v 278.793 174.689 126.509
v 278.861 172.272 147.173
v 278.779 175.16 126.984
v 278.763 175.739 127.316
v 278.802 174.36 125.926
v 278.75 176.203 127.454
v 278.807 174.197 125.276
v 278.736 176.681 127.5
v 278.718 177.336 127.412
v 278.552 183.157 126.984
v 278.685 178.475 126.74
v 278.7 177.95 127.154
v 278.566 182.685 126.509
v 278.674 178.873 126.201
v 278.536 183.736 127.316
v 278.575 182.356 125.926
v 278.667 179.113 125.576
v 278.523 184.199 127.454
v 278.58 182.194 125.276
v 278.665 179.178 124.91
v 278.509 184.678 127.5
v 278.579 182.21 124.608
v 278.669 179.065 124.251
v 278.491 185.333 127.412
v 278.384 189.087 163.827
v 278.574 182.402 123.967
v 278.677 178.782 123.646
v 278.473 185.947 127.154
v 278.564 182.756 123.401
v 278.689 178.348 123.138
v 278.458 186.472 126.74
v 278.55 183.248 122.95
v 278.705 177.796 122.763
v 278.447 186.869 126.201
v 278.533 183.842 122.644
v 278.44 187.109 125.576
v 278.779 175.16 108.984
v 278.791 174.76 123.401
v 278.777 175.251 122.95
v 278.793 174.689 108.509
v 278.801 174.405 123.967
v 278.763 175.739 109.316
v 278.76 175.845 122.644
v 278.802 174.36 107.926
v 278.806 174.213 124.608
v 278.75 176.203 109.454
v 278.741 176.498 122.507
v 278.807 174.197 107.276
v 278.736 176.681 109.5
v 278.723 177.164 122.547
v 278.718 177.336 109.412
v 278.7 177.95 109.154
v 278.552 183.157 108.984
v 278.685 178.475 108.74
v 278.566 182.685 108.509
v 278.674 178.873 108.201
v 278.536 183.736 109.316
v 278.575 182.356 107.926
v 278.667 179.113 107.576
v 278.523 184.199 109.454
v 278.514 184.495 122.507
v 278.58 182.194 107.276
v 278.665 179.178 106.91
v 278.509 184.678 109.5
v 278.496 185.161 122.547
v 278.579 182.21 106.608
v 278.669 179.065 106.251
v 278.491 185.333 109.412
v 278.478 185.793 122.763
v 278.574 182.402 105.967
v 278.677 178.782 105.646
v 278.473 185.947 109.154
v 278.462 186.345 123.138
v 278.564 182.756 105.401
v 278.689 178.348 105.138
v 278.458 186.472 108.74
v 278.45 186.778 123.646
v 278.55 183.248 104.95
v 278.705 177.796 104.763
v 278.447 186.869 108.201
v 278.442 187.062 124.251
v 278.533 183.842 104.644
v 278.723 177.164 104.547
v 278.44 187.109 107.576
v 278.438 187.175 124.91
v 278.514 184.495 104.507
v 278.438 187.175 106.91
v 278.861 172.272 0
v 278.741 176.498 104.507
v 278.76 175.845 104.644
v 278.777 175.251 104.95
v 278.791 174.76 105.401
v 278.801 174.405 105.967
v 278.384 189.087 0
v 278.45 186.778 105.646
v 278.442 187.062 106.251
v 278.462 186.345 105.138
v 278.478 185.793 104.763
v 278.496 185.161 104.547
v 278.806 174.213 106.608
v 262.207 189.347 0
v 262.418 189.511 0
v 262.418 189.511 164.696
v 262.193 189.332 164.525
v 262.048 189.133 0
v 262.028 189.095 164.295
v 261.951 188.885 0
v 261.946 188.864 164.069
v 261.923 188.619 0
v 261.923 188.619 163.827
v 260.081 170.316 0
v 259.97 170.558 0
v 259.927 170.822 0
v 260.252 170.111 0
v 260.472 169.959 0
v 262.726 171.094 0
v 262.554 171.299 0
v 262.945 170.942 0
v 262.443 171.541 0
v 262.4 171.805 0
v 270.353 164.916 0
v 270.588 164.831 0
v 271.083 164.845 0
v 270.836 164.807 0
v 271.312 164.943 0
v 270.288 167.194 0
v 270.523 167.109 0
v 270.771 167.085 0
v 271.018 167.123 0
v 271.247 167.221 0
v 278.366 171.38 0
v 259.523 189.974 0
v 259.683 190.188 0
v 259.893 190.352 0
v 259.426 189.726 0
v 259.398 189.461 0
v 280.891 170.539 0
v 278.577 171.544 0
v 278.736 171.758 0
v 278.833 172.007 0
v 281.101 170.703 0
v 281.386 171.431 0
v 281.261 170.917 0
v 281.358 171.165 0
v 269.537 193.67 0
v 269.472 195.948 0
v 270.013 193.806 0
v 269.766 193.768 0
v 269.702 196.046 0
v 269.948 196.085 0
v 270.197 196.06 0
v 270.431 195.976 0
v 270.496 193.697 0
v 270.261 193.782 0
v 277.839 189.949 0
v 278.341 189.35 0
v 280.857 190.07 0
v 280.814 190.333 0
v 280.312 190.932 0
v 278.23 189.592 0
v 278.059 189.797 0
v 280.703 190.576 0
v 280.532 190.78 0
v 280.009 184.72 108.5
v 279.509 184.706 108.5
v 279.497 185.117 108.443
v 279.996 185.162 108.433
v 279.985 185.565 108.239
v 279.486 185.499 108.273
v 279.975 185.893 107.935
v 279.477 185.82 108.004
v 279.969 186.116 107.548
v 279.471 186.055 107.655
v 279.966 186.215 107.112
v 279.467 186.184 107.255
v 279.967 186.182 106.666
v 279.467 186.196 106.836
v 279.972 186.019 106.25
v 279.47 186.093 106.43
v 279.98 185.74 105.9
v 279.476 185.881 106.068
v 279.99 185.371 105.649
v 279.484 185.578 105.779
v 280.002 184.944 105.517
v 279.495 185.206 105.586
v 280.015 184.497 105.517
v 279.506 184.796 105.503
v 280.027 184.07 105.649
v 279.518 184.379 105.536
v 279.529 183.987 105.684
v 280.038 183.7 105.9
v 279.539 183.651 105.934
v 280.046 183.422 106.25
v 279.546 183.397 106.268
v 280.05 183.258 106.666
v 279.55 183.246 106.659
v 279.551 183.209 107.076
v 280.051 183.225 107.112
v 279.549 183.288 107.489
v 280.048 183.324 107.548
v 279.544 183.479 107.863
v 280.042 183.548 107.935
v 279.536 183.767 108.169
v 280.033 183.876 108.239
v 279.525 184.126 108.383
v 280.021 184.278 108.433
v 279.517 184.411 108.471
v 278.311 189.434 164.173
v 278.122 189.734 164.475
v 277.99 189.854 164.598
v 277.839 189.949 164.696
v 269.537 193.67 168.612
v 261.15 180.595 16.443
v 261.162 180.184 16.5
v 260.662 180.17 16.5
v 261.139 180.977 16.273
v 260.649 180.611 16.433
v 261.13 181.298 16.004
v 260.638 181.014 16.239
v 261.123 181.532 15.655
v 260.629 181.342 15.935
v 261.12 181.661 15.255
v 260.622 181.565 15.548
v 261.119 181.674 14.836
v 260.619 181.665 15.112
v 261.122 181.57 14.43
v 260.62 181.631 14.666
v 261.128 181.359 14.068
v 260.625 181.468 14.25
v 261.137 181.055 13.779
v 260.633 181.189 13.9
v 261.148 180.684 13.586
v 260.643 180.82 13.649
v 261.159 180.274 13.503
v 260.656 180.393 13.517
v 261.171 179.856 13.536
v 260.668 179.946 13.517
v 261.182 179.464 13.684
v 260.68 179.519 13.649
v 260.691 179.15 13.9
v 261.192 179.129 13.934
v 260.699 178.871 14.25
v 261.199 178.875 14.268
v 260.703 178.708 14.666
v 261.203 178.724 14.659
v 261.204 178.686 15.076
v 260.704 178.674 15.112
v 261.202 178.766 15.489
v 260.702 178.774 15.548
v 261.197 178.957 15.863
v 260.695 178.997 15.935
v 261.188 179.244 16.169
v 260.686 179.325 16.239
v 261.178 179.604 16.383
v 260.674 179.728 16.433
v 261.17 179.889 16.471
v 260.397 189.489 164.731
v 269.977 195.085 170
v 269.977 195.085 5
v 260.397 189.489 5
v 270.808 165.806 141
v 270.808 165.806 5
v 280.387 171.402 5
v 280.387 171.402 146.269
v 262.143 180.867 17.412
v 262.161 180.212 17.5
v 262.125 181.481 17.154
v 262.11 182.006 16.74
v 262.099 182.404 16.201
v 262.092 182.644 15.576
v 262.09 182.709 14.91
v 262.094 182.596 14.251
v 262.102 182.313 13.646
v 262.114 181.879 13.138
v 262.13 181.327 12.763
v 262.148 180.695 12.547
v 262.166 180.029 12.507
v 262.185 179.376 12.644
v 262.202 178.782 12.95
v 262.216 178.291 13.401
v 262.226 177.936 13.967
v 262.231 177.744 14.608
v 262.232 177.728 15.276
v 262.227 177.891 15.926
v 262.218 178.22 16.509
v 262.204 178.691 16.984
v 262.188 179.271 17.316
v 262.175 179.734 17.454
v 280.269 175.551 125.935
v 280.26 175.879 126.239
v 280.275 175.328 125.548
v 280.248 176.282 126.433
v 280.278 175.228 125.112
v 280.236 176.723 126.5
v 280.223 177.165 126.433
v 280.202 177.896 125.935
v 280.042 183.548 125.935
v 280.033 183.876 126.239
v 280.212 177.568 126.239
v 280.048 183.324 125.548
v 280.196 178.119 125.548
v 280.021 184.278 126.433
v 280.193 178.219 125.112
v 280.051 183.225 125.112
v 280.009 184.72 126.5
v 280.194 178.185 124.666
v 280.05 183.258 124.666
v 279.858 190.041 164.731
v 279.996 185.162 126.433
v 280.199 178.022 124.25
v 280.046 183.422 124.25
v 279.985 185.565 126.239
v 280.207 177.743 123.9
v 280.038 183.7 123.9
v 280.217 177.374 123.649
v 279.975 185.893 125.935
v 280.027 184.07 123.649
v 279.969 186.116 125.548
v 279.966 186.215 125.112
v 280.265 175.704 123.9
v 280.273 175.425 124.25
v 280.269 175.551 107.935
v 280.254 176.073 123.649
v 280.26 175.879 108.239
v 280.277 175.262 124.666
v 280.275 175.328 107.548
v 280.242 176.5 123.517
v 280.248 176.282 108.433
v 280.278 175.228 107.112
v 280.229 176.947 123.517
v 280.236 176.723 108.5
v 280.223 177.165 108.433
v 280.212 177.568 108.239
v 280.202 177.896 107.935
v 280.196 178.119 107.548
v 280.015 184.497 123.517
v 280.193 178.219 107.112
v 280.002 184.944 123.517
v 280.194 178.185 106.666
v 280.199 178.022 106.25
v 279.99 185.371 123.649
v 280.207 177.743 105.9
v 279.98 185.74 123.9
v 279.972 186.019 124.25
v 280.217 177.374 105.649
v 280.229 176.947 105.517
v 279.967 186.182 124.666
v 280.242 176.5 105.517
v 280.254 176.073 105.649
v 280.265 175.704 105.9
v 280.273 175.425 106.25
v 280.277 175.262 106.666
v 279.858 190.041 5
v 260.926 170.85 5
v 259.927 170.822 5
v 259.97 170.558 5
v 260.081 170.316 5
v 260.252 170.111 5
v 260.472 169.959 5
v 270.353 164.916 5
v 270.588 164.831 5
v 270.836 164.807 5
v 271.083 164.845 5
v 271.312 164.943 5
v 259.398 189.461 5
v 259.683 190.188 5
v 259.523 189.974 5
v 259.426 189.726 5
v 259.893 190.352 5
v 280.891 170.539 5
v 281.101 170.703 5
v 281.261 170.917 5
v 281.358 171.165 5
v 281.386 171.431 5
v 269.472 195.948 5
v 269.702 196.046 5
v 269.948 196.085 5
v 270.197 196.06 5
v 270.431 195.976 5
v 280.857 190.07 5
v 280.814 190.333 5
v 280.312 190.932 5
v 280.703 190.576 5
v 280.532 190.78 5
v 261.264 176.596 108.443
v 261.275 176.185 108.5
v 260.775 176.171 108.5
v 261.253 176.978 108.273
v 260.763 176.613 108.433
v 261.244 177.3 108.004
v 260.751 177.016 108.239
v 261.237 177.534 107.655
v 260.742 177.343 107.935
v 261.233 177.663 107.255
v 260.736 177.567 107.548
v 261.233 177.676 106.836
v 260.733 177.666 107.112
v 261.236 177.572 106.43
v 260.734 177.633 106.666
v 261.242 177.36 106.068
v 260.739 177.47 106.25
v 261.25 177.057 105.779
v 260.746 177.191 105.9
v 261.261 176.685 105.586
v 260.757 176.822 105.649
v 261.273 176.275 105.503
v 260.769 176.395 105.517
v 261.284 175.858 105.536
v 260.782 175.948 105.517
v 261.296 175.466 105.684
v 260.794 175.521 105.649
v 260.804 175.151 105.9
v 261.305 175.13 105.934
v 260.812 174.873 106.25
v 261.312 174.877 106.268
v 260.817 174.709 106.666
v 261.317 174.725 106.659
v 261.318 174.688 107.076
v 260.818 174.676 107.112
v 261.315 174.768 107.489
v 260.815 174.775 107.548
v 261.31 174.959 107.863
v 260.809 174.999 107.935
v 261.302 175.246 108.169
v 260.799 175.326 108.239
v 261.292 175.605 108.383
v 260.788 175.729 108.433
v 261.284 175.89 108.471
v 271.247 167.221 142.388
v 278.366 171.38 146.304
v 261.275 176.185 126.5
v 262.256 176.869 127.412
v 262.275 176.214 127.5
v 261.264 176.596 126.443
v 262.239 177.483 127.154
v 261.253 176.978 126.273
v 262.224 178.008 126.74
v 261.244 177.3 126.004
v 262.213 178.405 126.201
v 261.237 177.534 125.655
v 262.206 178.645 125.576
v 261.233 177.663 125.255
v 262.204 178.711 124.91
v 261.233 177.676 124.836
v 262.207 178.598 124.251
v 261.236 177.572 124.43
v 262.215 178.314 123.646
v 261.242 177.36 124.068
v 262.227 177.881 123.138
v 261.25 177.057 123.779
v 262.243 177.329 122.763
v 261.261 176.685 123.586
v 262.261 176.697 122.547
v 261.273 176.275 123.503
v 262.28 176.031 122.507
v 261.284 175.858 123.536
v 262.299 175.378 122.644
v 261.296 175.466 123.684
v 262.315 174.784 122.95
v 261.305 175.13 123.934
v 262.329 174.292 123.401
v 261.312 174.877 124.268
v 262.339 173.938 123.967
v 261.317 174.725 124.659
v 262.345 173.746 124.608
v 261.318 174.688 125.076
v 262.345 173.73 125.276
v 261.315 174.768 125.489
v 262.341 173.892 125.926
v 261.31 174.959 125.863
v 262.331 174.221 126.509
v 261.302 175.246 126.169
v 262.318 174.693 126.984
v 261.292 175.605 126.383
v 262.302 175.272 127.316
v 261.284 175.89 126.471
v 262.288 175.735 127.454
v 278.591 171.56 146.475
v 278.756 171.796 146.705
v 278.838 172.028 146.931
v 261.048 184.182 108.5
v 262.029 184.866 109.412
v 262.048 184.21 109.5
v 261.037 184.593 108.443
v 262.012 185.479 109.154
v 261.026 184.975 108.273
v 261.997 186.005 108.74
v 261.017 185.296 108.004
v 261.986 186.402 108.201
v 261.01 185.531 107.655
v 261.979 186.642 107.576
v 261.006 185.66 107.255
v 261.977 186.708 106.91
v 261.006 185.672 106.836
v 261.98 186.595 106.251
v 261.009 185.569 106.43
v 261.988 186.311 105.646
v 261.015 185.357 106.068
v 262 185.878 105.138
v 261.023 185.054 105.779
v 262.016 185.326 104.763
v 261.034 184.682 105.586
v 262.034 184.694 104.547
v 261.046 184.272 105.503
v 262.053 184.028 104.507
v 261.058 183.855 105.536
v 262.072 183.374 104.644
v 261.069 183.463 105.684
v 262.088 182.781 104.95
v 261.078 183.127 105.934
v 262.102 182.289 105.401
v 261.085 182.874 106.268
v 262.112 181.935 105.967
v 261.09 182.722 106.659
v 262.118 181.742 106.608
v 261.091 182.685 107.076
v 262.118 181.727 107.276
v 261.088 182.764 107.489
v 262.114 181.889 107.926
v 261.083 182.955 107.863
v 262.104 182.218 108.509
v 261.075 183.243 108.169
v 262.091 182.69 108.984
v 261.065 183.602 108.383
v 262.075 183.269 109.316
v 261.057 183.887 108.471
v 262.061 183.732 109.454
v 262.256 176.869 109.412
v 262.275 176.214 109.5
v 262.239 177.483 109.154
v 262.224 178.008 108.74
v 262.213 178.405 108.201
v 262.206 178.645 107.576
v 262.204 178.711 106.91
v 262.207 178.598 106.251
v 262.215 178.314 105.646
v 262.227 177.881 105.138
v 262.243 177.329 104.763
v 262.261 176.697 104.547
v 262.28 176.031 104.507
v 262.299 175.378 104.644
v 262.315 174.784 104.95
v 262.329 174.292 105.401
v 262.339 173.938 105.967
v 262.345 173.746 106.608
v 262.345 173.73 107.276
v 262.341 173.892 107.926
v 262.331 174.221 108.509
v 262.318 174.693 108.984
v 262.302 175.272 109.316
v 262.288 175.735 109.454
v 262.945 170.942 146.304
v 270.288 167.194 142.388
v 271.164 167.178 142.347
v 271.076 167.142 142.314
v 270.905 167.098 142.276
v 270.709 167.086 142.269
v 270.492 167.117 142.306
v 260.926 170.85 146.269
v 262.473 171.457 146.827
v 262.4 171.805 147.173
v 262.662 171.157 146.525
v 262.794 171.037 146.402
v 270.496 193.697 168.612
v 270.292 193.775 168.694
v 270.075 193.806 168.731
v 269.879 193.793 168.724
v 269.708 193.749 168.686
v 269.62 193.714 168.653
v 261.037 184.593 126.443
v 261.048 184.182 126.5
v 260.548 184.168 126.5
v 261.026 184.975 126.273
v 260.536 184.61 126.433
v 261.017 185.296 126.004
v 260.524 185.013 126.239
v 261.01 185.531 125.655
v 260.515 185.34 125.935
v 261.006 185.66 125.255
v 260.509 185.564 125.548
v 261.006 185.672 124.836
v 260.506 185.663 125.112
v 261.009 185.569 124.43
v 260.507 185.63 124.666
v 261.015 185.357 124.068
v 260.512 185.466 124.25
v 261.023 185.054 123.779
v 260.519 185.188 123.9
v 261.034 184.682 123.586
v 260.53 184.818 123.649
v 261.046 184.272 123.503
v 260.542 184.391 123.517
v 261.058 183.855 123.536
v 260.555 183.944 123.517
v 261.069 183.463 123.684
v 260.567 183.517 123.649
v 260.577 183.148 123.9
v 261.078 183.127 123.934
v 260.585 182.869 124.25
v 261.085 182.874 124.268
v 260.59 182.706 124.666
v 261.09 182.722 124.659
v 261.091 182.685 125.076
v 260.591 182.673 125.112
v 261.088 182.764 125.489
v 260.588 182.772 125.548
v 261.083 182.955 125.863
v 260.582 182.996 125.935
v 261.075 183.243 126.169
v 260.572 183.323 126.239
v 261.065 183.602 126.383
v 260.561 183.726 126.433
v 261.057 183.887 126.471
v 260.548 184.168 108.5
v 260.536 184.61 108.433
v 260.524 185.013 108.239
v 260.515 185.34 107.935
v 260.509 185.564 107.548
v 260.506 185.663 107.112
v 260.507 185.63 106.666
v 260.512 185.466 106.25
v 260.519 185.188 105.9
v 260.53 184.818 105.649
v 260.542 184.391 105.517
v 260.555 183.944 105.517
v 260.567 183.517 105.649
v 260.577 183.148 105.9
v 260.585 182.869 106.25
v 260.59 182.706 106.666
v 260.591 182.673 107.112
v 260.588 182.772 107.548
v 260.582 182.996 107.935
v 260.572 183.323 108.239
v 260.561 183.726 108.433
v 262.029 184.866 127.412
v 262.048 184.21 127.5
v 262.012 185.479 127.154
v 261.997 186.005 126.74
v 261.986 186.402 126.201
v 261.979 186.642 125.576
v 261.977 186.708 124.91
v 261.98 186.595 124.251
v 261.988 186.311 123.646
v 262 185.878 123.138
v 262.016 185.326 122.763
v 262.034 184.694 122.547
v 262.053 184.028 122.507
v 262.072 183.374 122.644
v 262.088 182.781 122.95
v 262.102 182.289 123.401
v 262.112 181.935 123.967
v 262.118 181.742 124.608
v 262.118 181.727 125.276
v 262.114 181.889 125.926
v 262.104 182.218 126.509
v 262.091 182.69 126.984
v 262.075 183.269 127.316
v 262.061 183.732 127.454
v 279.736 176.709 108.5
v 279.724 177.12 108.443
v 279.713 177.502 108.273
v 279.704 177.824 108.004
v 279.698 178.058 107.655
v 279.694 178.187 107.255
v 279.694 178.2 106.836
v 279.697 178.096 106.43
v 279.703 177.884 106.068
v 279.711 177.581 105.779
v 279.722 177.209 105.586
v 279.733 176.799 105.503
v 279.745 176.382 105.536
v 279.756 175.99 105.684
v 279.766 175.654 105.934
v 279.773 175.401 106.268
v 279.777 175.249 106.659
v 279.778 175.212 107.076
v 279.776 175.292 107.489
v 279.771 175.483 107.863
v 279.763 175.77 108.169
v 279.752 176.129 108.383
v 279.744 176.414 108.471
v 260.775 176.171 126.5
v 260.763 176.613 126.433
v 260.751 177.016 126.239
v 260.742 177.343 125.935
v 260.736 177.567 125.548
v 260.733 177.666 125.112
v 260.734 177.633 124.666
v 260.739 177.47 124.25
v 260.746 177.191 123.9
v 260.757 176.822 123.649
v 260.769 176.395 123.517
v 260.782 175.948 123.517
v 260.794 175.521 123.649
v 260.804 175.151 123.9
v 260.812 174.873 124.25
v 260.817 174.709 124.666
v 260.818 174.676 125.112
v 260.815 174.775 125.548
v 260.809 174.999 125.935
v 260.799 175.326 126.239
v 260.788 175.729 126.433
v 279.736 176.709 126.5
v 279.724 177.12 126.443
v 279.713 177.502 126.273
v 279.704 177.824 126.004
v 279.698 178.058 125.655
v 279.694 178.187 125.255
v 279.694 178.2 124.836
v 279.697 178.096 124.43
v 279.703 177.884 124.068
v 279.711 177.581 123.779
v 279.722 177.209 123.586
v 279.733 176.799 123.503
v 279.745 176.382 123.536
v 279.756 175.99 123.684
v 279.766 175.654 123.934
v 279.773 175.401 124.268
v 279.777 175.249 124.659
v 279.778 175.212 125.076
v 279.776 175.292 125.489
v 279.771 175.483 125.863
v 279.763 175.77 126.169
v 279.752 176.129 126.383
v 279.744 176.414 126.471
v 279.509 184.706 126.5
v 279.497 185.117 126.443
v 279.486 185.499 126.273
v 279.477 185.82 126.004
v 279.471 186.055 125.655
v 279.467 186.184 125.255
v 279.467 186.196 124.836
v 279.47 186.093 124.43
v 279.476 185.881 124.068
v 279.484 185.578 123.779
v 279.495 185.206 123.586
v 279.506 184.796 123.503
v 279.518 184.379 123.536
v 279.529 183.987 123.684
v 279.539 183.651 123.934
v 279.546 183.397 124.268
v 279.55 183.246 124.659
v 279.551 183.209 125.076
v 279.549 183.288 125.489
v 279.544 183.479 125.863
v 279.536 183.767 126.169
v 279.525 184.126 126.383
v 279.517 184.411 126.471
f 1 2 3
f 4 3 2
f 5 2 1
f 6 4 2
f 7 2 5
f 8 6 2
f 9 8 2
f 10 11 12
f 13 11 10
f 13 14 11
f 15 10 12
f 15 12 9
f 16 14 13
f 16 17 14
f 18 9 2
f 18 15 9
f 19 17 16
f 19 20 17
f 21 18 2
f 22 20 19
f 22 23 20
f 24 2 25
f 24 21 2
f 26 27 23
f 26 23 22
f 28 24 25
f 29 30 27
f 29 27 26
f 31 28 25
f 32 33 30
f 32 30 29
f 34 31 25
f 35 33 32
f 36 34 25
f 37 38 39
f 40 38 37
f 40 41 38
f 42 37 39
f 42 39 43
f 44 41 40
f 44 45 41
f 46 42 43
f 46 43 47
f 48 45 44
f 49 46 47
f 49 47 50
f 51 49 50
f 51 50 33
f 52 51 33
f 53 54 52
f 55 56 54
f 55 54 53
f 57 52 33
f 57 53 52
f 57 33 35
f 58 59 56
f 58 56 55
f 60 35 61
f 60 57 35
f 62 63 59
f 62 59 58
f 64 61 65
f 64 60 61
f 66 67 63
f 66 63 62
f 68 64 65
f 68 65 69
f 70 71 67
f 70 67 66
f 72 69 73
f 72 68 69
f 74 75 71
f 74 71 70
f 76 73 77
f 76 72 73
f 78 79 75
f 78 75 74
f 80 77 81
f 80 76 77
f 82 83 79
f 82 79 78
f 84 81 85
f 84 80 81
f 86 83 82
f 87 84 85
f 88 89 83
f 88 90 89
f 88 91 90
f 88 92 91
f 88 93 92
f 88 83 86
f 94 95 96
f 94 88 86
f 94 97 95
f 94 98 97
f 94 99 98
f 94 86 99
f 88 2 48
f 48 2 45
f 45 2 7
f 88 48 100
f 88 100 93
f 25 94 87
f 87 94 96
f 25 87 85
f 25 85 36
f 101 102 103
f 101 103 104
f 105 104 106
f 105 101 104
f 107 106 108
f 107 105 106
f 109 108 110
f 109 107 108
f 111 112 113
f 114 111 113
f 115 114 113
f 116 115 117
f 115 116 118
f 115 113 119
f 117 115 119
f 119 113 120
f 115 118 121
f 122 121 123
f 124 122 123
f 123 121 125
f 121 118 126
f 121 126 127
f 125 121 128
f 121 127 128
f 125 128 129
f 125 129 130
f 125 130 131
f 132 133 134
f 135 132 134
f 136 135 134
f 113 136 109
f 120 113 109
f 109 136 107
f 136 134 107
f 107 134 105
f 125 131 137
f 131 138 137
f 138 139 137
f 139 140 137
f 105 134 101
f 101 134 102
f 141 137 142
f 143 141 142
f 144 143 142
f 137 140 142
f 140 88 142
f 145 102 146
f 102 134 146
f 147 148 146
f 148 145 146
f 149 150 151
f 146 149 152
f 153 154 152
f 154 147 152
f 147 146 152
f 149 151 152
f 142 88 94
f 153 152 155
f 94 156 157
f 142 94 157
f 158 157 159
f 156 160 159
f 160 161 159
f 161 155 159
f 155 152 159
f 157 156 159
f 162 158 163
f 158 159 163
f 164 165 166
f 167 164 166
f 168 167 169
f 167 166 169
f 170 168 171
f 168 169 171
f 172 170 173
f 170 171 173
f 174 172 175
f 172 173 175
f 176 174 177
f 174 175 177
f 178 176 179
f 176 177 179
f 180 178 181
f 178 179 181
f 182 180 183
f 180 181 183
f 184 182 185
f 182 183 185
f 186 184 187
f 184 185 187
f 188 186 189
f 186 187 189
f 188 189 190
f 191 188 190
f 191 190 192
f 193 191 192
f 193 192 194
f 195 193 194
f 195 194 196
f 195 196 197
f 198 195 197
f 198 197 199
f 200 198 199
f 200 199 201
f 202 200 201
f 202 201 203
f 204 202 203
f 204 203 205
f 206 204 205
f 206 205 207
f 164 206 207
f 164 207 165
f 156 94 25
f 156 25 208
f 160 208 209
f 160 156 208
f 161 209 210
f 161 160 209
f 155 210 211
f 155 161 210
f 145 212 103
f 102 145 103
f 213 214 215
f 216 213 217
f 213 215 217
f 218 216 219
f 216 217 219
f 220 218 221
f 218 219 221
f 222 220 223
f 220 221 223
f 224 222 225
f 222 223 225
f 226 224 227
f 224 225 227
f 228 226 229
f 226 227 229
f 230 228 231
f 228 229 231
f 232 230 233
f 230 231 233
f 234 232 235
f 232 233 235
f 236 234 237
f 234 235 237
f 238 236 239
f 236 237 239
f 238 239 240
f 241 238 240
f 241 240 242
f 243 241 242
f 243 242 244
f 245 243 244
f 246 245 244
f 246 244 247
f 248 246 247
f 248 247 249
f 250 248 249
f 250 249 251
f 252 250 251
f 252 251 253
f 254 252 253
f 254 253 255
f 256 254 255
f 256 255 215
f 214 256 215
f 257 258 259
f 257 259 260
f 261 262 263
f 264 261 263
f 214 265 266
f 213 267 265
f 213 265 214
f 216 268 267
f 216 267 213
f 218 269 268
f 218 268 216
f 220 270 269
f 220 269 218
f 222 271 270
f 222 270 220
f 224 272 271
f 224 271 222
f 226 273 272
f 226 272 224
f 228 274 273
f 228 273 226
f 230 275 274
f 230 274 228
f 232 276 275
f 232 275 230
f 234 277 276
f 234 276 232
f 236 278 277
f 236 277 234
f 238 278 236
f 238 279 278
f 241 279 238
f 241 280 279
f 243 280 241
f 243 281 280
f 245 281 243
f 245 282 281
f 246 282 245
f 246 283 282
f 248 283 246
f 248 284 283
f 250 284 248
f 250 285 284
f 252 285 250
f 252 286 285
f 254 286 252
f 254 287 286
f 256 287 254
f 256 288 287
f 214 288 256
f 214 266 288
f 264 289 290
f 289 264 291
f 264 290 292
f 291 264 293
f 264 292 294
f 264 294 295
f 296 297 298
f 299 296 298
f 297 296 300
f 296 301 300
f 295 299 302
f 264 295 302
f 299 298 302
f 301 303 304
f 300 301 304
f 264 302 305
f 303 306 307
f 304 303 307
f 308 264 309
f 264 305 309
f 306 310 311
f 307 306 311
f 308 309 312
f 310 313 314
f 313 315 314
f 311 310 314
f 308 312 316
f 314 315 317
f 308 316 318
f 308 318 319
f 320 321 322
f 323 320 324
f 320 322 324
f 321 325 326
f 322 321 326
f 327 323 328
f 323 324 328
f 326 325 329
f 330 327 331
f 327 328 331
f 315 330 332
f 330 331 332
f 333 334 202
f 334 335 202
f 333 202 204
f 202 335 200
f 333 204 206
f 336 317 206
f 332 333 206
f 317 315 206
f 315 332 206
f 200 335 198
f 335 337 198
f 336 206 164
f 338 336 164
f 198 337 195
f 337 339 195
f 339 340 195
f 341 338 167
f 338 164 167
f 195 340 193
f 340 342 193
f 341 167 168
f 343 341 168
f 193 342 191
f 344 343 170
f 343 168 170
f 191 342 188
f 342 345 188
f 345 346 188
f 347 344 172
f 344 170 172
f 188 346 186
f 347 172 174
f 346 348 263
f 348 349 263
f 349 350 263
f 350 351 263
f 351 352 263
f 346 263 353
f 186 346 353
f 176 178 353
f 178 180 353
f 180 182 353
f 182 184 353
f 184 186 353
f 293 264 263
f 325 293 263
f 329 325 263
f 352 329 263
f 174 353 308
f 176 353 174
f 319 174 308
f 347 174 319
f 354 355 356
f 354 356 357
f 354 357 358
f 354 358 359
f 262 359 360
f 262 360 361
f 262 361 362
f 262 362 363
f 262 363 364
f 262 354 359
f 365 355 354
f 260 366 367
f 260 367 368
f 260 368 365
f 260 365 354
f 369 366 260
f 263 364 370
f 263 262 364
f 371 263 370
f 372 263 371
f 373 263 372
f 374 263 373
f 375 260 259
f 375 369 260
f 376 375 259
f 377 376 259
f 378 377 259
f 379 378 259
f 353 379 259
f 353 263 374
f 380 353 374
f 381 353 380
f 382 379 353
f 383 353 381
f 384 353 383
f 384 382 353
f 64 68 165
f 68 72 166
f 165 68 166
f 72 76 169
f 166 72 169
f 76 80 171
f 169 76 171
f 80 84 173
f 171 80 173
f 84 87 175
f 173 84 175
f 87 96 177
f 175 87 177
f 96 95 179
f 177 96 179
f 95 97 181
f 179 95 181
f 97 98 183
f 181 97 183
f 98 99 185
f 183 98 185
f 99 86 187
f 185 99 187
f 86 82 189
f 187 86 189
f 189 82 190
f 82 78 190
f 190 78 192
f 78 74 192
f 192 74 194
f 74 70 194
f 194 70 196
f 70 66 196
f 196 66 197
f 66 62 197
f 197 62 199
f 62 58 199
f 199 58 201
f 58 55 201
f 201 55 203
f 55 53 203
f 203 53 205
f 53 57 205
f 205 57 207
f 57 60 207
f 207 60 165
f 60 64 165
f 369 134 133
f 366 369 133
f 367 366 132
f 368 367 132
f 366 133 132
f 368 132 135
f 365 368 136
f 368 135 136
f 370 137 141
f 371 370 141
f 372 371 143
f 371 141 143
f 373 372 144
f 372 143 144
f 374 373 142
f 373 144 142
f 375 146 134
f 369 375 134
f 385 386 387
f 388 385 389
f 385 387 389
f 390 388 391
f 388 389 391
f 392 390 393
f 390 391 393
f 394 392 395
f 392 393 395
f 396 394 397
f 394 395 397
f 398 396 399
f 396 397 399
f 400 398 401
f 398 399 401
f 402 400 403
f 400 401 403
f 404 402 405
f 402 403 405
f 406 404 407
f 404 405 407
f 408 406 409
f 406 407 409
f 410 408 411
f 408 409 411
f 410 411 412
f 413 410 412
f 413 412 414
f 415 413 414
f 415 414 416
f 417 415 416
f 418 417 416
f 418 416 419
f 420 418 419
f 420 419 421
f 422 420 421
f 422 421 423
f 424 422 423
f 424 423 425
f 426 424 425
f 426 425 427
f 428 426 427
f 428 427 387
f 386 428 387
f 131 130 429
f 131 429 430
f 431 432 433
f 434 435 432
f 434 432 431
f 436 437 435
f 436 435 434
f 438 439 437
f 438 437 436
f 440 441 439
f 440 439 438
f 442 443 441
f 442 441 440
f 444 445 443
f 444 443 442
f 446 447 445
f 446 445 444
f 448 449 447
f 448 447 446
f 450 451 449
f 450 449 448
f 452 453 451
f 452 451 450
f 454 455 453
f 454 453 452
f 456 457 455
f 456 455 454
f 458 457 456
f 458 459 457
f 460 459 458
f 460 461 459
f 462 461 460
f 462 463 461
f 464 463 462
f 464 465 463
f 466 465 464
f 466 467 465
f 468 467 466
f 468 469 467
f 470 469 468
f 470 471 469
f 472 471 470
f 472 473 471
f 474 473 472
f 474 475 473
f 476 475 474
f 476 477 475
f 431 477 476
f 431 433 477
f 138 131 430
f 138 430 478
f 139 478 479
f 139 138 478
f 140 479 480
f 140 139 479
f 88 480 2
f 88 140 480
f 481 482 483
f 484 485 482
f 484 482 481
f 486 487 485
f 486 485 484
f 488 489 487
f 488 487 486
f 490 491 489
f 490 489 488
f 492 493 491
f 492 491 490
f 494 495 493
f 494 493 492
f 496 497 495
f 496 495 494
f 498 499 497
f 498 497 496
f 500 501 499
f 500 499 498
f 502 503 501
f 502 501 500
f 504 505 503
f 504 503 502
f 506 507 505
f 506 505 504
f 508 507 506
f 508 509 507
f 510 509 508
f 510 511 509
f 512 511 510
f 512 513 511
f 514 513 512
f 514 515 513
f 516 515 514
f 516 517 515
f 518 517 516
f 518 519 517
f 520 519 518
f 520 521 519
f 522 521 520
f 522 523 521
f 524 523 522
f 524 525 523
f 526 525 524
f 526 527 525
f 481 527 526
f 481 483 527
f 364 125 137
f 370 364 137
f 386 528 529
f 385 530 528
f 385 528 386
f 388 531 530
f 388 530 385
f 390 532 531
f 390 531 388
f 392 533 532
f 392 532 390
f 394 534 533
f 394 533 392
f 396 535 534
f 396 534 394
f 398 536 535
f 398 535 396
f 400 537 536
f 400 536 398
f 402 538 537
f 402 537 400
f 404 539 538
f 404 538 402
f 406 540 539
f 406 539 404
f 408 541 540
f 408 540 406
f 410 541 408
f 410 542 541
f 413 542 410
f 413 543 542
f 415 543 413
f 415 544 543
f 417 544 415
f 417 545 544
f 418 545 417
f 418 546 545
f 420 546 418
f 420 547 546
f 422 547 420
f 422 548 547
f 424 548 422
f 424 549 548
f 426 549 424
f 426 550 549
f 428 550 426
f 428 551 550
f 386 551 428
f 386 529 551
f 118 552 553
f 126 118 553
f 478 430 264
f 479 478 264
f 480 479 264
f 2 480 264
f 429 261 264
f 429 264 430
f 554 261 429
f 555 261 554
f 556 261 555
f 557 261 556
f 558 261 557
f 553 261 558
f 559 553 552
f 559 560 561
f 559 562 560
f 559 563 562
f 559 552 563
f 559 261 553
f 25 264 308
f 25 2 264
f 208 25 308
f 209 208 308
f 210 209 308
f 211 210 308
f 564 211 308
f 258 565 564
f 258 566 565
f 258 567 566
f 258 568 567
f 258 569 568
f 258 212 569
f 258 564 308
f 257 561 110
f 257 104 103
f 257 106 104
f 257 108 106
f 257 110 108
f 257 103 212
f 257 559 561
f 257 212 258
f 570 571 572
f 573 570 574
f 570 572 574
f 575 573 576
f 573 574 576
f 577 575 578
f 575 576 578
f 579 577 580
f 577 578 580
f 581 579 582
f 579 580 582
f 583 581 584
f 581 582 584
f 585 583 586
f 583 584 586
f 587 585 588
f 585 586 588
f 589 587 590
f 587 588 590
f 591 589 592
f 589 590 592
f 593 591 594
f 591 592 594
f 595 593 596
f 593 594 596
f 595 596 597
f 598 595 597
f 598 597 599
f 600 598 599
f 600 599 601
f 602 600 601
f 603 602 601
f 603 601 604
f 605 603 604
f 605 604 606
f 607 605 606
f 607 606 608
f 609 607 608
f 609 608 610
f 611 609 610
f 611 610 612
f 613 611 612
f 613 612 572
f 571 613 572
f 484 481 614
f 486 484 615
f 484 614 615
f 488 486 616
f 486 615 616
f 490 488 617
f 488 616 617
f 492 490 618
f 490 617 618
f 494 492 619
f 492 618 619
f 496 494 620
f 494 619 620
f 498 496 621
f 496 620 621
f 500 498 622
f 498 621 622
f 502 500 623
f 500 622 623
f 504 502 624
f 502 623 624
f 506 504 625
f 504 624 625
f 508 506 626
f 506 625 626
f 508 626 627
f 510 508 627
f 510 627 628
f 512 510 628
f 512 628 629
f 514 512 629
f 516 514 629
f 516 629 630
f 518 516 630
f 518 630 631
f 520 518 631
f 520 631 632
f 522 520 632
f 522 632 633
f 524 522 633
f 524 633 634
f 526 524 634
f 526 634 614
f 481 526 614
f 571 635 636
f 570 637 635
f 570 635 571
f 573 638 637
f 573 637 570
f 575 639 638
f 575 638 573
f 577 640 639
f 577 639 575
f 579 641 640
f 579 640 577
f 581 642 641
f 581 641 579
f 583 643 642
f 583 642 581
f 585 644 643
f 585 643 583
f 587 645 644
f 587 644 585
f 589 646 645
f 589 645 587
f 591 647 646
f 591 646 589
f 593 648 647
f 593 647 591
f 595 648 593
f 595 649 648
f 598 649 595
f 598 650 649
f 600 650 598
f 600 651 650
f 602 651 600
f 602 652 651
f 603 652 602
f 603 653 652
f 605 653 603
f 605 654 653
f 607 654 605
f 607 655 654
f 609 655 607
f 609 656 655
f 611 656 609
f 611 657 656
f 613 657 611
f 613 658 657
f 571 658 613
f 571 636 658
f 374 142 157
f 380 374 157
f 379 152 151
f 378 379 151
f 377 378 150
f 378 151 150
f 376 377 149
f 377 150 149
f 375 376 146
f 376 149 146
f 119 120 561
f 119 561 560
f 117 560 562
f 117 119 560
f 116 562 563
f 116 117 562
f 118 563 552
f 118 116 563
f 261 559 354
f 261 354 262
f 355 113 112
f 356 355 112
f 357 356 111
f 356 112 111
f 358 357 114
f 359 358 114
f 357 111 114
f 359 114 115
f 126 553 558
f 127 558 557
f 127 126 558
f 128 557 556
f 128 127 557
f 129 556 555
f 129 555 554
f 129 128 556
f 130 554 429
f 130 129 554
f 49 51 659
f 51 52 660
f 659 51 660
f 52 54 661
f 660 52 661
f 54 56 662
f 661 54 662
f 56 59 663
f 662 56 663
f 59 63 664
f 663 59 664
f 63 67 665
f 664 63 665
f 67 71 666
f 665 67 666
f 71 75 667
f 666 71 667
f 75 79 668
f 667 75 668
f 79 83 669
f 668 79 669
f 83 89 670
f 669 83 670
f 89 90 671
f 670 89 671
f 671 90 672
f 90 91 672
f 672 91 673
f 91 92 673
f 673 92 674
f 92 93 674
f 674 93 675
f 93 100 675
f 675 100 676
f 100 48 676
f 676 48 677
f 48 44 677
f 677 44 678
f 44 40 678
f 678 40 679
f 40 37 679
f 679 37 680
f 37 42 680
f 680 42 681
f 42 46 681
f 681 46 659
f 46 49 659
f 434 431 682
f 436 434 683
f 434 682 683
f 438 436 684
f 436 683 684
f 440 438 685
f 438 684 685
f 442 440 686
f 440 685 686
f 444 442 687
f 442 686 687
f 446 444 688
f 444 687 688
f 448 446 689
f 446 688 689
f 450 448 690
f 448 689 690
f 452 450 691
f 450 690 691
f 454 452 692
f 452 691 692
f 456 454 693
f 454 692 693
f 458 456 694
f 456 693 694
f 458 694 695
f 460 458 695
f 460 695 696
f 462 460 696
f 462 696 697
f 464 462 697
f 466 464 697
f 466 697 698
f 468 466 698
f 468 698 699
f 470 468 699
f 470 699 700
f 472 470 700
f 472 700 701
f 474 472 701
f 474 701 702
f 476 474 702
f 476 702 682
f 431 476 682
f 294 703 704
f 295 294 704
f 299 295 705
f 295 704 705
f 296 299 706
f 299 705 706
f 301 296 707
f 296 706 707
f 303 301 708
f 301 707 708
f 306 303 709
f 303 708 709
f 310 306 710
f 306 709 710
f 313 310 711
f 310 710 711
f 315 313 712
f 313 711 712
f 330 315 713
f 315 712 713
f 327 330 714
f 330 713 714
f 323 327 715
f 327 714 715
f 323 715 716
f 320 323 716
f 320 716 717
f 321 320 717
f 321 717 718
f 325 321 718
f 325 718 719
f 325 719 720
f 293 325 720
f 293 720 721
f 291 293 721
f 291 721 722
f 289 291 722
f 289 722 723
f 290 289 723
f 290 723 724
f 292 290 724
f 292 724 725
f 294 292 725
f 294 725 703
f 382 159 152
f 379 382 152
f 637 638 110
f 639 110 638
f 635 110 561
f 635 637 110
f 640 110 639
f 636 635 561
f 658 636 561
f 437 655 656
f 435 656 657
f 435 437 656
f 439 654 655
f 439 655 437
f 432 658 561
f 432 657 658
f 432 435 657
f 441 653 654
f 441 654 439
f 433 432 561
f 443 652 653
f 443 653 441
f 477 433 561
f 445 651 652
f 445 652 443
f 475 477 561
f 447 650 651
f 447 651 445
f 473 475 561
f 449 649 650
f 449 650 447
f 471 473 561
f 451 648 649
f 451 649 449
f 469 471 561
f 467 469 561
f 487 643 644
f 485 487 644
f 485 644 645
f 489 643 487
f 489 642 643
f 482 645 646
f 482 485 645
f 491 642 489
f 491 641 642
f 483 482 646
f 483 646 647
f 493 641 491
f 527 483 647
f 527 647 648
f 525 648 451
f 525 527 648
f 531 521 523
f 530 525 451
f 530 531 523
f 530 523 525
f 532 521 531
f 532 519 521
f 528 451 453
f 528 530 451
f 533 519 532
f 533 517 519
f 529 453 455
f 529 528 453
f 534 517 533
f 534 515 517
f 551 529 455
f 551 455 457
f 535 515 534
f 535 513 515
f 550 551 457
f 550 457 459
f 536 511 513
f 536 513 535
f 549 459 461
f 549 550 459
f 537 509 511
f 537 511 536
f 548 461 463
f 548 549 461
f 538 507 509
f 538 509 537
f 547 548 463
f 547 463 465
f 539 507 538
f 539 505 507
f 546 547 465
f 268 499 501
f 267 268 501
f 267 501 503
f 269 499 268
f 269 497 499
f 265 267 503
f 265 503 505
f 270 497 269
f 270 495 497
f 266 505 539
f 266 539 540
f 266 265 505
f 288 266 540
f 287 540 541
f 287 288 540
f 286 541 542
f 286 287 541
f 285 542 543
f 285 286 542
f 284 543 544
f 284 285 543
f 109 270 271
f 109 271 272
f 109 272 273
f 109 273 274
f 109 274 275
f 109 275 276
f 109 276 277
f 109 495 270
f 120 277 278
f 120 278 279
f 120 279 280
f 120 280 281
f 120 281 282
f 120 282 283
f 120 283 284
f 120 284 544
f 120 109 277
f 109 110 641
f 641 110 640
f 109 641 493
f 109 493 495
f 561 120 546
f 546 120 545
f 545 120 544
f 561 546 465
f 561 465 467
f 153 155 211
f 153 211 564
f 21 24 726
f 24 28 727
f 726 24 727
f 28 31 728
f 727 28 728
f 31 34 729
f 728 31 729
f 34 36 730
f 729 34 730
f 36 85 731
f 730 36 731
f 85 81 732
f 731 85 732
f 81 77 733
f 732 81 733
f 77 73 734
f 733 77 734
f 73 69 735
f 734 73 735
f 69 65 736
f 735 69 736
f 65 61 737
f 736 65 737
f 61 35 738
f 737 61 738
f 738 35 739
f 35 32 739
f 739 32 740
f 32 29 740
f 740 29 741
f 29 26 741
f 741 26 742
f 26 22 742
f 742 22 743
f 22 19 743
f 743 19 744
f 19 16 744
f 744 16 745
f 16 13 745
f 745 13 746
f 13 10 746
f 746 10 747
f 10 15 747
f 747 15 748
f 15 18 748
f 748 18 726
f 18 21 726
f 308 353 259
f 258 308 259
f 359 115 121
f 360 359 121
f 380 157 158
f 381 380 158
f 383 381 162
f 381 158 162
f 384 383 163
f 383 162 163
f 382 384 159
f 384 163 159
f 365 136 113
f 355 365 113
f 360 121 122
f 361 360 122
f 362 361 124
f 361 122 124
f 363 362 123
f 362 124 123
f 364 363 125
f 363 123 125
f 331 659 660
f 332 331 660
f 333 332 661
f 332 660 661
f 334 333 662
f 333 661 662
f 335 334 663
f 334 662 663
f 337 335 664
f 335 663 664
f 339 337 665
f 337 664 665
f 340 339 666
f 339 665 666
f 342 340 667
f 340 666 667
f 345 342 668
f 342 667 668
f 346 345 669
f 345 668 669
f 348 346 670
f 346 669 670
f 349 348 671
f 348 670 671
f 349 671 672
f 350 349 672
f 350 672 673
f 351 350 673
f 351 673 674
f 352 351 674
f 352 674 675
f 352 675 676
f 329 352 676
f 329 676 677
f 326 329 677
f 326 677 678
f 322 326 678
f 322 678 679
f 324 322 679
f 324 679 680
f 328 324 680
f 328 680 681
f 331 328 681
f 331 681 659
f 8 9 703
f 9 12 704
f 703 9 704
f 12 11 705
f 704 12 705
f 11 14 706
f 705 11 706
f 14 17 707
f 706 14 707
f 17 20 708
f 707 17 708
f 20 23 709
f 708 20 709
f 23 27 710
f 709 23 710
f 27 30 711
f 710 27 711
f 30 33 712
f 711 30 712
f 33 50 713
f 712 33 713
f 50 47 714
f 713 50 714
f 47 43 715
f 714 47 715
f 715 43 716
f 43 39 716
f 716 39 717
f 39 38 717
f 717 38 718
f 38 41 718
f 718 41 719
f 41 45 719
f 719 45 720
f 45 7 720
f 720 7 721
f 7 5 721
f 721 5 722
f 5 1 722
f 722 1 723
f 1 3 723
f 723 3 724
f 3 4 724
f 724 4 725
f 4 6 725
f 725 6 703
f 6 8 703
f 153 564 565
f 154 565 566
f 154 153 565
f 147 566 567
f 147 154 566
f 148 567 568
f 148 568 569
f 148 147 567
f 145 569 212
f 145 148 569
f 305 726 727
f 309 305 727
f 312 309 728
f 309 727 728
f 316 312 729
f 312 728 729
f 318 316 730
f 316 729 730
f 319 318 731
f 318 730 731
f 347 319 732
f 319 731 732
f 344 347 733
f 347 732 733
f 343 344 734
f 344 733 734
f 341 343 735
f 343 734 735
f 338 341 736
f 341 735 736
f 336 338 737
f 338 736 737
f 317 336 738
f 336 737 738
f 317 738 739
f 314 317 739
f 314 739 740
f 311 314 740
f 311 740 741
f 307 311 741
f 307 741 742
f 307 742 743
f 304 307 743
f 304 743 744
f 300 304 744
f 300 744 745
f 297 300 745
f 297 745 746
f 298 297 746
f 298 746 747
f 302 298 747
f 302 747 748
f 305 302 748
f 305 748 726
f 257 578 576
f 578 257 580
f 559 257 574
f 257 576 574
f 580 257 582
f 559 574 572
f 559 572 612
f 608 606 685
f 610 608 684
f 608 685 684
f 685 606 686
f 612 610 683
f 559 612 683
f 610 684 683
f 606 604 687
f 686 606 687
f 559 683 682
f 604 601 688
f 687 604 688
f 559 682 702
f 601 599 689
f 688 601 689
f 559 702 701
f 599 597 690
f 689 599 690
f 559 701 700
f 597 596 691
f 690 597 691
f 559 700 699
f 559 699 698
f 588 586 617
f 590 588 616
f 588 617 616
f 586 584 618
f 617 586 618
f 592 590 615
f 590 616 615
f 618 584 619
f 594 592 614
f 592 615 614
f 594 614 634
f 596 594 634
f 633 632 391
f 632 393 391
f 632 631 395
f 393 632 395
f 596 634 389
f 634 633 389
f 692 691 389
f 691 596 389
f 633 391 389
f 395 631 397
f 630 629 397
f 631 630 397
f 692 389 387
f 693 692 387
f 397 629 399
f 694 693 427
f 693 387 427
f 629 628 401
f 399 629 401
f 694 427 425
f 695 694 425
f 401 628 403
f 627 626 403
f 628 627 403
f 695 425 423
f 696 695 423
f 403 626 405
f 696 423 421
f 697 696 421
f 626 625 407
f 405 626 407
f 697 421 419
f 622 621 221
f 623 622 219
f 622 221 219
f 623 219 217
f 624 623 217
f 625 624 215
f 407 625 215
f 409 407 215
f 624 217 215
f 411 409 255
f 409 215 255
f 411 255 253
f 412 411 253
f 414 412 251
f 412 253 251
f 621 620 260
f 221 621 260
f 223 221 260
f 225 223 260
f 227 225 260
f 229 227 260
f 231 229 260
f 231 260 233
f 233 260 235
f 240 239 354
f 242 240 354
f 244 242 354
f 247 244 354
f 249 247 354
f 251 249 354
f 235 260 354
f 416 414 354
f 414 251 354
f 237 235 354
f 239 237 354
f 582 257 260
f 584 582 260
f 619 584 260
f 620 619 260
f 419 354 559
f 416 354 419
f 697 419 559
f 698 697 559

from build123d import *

# Parameters (mm, degrees)
BOSS_EXTRUDE1_DEPTH = 5
BOSS_EXTRUDE2_DEPTH = 165
SKETCH3_R           = 1.5
CUT_EXTRUDE1_DEPTH  = 165
SKETCH4_R           = 1.5
CUT_EXTRUDE2_DEPTH  = 3
CHAMFER1_SIZE       = 1


with BuildPart() as part:
    # Sketch1 → Boss-Extrude1 (new body)
    with BuildSketch(Plane.XY):
        with BuildLine():
            Line((269.472126518, 195.948380571), (259.892978717, 190.352443674))
            ThreePointArc((259.892978717, 190.352443674), (259.523120334, 189.974415309), (259.397797004, 189.460611133))
            Line((259.397797004, 189.460611133), (259.926827069, 170.821662041))
            ThreePointArc((259.926827069, 170.821662041), (260.081091813, 170.315793424), (260.471796679, 169.959352158))
            Line((260.471796679, 169.959352158), (270.352926754, 164.915757134))
            ThreePointArc((270.352926754, 164.915757134), (270.835926205, 164.806841188), (271.311970321, 164.942977708))
            Line((271.311970321, 164.942977708), (280.891118122, 170.538914605))
            ThreePointArc((280.891118122, 170.538914605), (281.260976505, 170.916942969), (281.386299835, 171.430747146))
            Line((281.386299835, 171.430747146), (280.85726977, 190.069696238))
            ThreePointArc((280.85726977, 190.069696238), (280.703005026, 190.575564854), (280.31230016, 190.93200612))
            Line((280.31230016, 190.93200612), (270.431170085, 195.975601144))
            ThreePointArc((270.431170085, 195.975601144), (269.948170634, 196.08451709), (269.472126518, 195.948380571))
        make_face()
        with BuildLine():
            Line((269.536796739, 193.669899558), (262.417863464, 189.511168301))
            ThreePointArc((262.417863464, 189.511168301), (262.048005081, 189.133139936), (261.922681752, 188.61933576))
            Line((261.922681752, 188.61933576), (262.399929545, 171.804795492))
            ThreePointArc((262.399929545, 171.804795492), (262.554194289, 171.298926876), (262.944899155, 170.942485609))
            Line((262.944899155, 170.942485609), (270.288256533, 167.194238147))
            ThreePointArc((270.288256533, 167.194238147), (270.771255984, 167.085322201), (271.2473001, 167.22145872))
            Line((271.2473001, 167.22145872), (278.366233375, 171.380189978))
            ThreePointArc((278.366233375, 171.380189978), (278.736091758, 171.758218342), (278.861415087, 172.272022518))
            Line((278.861415087, 172.272022518), (278.384167294, 189.086562786))
            ThreePointArc((278.384167294, 189.086562786), (278.22990255, 189.592431403), (277.839197684, 189.948872669))
            Line((277.839197684, 189.948872669), (270.495840306, 193.697120131))
            ThreePointArc((270.495840306, 193.697120131), (270.012840855, 193.806036078), (269.536796739, 193.669899558))
        make_face(mode=Mode.SUBTRACT)
    extrude(amount=BOSS_EXTRUDE1_DEPTH)

    # Sketch2 → Boss-Extrude2 (add)
    with BuildSketch(Plane.XY.offset(5)):
        Polygon((279.857672325, 190.041324622), (269.97654225, 195.084919646), (260.397394449, 189.488982749), (260.926424514, 170.850033657), (270.807554589, 165.806438633), (280.38670239, 171.40237553), align=None)
        with BuildLine():
            Line((269.536796739, 193.669899558), (262.417863464, 189.511168301))
            ThreePointArc((262.417863464, 189.511168301), (262.048005081, 189.133139936), (261.922681752, 188.61933576))
            Line((261.922681752, 188.61933576), (262.399929545, 171.804795492))
            ThreePointArc((262.399929545, 171.804795492), (262.554194289, 171.298926876), (262.944899155, 170.942485609))
            Line((262.944899155, 170.942485609), (270.288256533, 167.194238147))
            ThreePointArc((270.288256533, 167.194238147), (270.771255984, 167.085322201), (271.2473001, 167.22145872))
            Line((271.2473001, 167.22145872), (278.366233375, 171.380189978))
            ThreePointArc((278.366233375, 171.380189978), (278.736091758, 171.758218342), (278.861415087, 172.272022518))
            Line((278.861415087, 172.272022518), (278.384167294, 189.086562786))
            ThreePointArc((278.384167294, 189.086562786), (278.22990255, 189.592431403), (277.839197684, 189.948872669))
            Line((277.839197684, 189.948872669), (270.495840306, 193.697120131))
            ThreePointArc((270.495840306, 193.697120131), (270.012840855, 193.806036078), (269.536796739, 193.669899558))
        make_face(mode=Mode.SUBTRACT)
    extrude(amount=BOSS_EXTRUDE2_DEPTH)

    # Sketch3 → Cut-Extrude1 (cut)
    with BuildSketch(Plane(origin=(265.561732352, 7.537449653, 0), x_dir=(0, 0, 1), z_dir=(-0.999597445, -0.028371616, 0))):
        with Locations((107, 176.701580488)):
            Circle(SKETCH3_R)
        with Locations((107, 168.701580488)):
            Circle(SKETCH3_R)
        with Locations((125, 176.701580488)):
            Circle(SKETCH3_R)
        with Locations((125, 168.701580488)):
            Circle(SKETCH3_R)
        Polygon((170, 187.346716472), (170, 158.056444505), (141, 158.056444505), align=None)
    extrude(amount=-CUT_EXTRUDE1_DEPTH, mode=Mode.SUBTRACT)

    # Sketch4 → Cut-Extrude2 (cut)
    with BuildSketch(Plane(origin=(265.561732352, 7.537449653, 0), x_dir=(0, 0, 1), z_dir=(-0.999597445, -0.028371616, 0))):
        with Locations((15, 172.701580488)):
            Circle(SKETCH4_R)
    extrude(amount=-CUT_EXTRUDE2_DEPTH, mode=Mode.SUBTRACT)

    # Chamfer1
    chamfer1_edges = [part.edges().sort_by_distance(p)[0] for p in [
        (262.274792111, 176.213675847, 105.5),
        (278.736277653, 176.680902874, 105.5),
        (262.047819186, 184.210455405, 123.5),
        (278.509304728, 184.677682431, 123.5),
        (262.274792111, 176.213675847, 123.5),
        (278.736277653, 176.680902874, 123.5),
        (262.047819186, 184.210455405, 105.5),
        (278.509304728, 184.677682431, 105.5),
        (262.161305648, 180.212065626, 13.5),
    ]]
    chamfer(chamfer1_edges, length=CHAMFER1_SIZE)


solid = part.part
